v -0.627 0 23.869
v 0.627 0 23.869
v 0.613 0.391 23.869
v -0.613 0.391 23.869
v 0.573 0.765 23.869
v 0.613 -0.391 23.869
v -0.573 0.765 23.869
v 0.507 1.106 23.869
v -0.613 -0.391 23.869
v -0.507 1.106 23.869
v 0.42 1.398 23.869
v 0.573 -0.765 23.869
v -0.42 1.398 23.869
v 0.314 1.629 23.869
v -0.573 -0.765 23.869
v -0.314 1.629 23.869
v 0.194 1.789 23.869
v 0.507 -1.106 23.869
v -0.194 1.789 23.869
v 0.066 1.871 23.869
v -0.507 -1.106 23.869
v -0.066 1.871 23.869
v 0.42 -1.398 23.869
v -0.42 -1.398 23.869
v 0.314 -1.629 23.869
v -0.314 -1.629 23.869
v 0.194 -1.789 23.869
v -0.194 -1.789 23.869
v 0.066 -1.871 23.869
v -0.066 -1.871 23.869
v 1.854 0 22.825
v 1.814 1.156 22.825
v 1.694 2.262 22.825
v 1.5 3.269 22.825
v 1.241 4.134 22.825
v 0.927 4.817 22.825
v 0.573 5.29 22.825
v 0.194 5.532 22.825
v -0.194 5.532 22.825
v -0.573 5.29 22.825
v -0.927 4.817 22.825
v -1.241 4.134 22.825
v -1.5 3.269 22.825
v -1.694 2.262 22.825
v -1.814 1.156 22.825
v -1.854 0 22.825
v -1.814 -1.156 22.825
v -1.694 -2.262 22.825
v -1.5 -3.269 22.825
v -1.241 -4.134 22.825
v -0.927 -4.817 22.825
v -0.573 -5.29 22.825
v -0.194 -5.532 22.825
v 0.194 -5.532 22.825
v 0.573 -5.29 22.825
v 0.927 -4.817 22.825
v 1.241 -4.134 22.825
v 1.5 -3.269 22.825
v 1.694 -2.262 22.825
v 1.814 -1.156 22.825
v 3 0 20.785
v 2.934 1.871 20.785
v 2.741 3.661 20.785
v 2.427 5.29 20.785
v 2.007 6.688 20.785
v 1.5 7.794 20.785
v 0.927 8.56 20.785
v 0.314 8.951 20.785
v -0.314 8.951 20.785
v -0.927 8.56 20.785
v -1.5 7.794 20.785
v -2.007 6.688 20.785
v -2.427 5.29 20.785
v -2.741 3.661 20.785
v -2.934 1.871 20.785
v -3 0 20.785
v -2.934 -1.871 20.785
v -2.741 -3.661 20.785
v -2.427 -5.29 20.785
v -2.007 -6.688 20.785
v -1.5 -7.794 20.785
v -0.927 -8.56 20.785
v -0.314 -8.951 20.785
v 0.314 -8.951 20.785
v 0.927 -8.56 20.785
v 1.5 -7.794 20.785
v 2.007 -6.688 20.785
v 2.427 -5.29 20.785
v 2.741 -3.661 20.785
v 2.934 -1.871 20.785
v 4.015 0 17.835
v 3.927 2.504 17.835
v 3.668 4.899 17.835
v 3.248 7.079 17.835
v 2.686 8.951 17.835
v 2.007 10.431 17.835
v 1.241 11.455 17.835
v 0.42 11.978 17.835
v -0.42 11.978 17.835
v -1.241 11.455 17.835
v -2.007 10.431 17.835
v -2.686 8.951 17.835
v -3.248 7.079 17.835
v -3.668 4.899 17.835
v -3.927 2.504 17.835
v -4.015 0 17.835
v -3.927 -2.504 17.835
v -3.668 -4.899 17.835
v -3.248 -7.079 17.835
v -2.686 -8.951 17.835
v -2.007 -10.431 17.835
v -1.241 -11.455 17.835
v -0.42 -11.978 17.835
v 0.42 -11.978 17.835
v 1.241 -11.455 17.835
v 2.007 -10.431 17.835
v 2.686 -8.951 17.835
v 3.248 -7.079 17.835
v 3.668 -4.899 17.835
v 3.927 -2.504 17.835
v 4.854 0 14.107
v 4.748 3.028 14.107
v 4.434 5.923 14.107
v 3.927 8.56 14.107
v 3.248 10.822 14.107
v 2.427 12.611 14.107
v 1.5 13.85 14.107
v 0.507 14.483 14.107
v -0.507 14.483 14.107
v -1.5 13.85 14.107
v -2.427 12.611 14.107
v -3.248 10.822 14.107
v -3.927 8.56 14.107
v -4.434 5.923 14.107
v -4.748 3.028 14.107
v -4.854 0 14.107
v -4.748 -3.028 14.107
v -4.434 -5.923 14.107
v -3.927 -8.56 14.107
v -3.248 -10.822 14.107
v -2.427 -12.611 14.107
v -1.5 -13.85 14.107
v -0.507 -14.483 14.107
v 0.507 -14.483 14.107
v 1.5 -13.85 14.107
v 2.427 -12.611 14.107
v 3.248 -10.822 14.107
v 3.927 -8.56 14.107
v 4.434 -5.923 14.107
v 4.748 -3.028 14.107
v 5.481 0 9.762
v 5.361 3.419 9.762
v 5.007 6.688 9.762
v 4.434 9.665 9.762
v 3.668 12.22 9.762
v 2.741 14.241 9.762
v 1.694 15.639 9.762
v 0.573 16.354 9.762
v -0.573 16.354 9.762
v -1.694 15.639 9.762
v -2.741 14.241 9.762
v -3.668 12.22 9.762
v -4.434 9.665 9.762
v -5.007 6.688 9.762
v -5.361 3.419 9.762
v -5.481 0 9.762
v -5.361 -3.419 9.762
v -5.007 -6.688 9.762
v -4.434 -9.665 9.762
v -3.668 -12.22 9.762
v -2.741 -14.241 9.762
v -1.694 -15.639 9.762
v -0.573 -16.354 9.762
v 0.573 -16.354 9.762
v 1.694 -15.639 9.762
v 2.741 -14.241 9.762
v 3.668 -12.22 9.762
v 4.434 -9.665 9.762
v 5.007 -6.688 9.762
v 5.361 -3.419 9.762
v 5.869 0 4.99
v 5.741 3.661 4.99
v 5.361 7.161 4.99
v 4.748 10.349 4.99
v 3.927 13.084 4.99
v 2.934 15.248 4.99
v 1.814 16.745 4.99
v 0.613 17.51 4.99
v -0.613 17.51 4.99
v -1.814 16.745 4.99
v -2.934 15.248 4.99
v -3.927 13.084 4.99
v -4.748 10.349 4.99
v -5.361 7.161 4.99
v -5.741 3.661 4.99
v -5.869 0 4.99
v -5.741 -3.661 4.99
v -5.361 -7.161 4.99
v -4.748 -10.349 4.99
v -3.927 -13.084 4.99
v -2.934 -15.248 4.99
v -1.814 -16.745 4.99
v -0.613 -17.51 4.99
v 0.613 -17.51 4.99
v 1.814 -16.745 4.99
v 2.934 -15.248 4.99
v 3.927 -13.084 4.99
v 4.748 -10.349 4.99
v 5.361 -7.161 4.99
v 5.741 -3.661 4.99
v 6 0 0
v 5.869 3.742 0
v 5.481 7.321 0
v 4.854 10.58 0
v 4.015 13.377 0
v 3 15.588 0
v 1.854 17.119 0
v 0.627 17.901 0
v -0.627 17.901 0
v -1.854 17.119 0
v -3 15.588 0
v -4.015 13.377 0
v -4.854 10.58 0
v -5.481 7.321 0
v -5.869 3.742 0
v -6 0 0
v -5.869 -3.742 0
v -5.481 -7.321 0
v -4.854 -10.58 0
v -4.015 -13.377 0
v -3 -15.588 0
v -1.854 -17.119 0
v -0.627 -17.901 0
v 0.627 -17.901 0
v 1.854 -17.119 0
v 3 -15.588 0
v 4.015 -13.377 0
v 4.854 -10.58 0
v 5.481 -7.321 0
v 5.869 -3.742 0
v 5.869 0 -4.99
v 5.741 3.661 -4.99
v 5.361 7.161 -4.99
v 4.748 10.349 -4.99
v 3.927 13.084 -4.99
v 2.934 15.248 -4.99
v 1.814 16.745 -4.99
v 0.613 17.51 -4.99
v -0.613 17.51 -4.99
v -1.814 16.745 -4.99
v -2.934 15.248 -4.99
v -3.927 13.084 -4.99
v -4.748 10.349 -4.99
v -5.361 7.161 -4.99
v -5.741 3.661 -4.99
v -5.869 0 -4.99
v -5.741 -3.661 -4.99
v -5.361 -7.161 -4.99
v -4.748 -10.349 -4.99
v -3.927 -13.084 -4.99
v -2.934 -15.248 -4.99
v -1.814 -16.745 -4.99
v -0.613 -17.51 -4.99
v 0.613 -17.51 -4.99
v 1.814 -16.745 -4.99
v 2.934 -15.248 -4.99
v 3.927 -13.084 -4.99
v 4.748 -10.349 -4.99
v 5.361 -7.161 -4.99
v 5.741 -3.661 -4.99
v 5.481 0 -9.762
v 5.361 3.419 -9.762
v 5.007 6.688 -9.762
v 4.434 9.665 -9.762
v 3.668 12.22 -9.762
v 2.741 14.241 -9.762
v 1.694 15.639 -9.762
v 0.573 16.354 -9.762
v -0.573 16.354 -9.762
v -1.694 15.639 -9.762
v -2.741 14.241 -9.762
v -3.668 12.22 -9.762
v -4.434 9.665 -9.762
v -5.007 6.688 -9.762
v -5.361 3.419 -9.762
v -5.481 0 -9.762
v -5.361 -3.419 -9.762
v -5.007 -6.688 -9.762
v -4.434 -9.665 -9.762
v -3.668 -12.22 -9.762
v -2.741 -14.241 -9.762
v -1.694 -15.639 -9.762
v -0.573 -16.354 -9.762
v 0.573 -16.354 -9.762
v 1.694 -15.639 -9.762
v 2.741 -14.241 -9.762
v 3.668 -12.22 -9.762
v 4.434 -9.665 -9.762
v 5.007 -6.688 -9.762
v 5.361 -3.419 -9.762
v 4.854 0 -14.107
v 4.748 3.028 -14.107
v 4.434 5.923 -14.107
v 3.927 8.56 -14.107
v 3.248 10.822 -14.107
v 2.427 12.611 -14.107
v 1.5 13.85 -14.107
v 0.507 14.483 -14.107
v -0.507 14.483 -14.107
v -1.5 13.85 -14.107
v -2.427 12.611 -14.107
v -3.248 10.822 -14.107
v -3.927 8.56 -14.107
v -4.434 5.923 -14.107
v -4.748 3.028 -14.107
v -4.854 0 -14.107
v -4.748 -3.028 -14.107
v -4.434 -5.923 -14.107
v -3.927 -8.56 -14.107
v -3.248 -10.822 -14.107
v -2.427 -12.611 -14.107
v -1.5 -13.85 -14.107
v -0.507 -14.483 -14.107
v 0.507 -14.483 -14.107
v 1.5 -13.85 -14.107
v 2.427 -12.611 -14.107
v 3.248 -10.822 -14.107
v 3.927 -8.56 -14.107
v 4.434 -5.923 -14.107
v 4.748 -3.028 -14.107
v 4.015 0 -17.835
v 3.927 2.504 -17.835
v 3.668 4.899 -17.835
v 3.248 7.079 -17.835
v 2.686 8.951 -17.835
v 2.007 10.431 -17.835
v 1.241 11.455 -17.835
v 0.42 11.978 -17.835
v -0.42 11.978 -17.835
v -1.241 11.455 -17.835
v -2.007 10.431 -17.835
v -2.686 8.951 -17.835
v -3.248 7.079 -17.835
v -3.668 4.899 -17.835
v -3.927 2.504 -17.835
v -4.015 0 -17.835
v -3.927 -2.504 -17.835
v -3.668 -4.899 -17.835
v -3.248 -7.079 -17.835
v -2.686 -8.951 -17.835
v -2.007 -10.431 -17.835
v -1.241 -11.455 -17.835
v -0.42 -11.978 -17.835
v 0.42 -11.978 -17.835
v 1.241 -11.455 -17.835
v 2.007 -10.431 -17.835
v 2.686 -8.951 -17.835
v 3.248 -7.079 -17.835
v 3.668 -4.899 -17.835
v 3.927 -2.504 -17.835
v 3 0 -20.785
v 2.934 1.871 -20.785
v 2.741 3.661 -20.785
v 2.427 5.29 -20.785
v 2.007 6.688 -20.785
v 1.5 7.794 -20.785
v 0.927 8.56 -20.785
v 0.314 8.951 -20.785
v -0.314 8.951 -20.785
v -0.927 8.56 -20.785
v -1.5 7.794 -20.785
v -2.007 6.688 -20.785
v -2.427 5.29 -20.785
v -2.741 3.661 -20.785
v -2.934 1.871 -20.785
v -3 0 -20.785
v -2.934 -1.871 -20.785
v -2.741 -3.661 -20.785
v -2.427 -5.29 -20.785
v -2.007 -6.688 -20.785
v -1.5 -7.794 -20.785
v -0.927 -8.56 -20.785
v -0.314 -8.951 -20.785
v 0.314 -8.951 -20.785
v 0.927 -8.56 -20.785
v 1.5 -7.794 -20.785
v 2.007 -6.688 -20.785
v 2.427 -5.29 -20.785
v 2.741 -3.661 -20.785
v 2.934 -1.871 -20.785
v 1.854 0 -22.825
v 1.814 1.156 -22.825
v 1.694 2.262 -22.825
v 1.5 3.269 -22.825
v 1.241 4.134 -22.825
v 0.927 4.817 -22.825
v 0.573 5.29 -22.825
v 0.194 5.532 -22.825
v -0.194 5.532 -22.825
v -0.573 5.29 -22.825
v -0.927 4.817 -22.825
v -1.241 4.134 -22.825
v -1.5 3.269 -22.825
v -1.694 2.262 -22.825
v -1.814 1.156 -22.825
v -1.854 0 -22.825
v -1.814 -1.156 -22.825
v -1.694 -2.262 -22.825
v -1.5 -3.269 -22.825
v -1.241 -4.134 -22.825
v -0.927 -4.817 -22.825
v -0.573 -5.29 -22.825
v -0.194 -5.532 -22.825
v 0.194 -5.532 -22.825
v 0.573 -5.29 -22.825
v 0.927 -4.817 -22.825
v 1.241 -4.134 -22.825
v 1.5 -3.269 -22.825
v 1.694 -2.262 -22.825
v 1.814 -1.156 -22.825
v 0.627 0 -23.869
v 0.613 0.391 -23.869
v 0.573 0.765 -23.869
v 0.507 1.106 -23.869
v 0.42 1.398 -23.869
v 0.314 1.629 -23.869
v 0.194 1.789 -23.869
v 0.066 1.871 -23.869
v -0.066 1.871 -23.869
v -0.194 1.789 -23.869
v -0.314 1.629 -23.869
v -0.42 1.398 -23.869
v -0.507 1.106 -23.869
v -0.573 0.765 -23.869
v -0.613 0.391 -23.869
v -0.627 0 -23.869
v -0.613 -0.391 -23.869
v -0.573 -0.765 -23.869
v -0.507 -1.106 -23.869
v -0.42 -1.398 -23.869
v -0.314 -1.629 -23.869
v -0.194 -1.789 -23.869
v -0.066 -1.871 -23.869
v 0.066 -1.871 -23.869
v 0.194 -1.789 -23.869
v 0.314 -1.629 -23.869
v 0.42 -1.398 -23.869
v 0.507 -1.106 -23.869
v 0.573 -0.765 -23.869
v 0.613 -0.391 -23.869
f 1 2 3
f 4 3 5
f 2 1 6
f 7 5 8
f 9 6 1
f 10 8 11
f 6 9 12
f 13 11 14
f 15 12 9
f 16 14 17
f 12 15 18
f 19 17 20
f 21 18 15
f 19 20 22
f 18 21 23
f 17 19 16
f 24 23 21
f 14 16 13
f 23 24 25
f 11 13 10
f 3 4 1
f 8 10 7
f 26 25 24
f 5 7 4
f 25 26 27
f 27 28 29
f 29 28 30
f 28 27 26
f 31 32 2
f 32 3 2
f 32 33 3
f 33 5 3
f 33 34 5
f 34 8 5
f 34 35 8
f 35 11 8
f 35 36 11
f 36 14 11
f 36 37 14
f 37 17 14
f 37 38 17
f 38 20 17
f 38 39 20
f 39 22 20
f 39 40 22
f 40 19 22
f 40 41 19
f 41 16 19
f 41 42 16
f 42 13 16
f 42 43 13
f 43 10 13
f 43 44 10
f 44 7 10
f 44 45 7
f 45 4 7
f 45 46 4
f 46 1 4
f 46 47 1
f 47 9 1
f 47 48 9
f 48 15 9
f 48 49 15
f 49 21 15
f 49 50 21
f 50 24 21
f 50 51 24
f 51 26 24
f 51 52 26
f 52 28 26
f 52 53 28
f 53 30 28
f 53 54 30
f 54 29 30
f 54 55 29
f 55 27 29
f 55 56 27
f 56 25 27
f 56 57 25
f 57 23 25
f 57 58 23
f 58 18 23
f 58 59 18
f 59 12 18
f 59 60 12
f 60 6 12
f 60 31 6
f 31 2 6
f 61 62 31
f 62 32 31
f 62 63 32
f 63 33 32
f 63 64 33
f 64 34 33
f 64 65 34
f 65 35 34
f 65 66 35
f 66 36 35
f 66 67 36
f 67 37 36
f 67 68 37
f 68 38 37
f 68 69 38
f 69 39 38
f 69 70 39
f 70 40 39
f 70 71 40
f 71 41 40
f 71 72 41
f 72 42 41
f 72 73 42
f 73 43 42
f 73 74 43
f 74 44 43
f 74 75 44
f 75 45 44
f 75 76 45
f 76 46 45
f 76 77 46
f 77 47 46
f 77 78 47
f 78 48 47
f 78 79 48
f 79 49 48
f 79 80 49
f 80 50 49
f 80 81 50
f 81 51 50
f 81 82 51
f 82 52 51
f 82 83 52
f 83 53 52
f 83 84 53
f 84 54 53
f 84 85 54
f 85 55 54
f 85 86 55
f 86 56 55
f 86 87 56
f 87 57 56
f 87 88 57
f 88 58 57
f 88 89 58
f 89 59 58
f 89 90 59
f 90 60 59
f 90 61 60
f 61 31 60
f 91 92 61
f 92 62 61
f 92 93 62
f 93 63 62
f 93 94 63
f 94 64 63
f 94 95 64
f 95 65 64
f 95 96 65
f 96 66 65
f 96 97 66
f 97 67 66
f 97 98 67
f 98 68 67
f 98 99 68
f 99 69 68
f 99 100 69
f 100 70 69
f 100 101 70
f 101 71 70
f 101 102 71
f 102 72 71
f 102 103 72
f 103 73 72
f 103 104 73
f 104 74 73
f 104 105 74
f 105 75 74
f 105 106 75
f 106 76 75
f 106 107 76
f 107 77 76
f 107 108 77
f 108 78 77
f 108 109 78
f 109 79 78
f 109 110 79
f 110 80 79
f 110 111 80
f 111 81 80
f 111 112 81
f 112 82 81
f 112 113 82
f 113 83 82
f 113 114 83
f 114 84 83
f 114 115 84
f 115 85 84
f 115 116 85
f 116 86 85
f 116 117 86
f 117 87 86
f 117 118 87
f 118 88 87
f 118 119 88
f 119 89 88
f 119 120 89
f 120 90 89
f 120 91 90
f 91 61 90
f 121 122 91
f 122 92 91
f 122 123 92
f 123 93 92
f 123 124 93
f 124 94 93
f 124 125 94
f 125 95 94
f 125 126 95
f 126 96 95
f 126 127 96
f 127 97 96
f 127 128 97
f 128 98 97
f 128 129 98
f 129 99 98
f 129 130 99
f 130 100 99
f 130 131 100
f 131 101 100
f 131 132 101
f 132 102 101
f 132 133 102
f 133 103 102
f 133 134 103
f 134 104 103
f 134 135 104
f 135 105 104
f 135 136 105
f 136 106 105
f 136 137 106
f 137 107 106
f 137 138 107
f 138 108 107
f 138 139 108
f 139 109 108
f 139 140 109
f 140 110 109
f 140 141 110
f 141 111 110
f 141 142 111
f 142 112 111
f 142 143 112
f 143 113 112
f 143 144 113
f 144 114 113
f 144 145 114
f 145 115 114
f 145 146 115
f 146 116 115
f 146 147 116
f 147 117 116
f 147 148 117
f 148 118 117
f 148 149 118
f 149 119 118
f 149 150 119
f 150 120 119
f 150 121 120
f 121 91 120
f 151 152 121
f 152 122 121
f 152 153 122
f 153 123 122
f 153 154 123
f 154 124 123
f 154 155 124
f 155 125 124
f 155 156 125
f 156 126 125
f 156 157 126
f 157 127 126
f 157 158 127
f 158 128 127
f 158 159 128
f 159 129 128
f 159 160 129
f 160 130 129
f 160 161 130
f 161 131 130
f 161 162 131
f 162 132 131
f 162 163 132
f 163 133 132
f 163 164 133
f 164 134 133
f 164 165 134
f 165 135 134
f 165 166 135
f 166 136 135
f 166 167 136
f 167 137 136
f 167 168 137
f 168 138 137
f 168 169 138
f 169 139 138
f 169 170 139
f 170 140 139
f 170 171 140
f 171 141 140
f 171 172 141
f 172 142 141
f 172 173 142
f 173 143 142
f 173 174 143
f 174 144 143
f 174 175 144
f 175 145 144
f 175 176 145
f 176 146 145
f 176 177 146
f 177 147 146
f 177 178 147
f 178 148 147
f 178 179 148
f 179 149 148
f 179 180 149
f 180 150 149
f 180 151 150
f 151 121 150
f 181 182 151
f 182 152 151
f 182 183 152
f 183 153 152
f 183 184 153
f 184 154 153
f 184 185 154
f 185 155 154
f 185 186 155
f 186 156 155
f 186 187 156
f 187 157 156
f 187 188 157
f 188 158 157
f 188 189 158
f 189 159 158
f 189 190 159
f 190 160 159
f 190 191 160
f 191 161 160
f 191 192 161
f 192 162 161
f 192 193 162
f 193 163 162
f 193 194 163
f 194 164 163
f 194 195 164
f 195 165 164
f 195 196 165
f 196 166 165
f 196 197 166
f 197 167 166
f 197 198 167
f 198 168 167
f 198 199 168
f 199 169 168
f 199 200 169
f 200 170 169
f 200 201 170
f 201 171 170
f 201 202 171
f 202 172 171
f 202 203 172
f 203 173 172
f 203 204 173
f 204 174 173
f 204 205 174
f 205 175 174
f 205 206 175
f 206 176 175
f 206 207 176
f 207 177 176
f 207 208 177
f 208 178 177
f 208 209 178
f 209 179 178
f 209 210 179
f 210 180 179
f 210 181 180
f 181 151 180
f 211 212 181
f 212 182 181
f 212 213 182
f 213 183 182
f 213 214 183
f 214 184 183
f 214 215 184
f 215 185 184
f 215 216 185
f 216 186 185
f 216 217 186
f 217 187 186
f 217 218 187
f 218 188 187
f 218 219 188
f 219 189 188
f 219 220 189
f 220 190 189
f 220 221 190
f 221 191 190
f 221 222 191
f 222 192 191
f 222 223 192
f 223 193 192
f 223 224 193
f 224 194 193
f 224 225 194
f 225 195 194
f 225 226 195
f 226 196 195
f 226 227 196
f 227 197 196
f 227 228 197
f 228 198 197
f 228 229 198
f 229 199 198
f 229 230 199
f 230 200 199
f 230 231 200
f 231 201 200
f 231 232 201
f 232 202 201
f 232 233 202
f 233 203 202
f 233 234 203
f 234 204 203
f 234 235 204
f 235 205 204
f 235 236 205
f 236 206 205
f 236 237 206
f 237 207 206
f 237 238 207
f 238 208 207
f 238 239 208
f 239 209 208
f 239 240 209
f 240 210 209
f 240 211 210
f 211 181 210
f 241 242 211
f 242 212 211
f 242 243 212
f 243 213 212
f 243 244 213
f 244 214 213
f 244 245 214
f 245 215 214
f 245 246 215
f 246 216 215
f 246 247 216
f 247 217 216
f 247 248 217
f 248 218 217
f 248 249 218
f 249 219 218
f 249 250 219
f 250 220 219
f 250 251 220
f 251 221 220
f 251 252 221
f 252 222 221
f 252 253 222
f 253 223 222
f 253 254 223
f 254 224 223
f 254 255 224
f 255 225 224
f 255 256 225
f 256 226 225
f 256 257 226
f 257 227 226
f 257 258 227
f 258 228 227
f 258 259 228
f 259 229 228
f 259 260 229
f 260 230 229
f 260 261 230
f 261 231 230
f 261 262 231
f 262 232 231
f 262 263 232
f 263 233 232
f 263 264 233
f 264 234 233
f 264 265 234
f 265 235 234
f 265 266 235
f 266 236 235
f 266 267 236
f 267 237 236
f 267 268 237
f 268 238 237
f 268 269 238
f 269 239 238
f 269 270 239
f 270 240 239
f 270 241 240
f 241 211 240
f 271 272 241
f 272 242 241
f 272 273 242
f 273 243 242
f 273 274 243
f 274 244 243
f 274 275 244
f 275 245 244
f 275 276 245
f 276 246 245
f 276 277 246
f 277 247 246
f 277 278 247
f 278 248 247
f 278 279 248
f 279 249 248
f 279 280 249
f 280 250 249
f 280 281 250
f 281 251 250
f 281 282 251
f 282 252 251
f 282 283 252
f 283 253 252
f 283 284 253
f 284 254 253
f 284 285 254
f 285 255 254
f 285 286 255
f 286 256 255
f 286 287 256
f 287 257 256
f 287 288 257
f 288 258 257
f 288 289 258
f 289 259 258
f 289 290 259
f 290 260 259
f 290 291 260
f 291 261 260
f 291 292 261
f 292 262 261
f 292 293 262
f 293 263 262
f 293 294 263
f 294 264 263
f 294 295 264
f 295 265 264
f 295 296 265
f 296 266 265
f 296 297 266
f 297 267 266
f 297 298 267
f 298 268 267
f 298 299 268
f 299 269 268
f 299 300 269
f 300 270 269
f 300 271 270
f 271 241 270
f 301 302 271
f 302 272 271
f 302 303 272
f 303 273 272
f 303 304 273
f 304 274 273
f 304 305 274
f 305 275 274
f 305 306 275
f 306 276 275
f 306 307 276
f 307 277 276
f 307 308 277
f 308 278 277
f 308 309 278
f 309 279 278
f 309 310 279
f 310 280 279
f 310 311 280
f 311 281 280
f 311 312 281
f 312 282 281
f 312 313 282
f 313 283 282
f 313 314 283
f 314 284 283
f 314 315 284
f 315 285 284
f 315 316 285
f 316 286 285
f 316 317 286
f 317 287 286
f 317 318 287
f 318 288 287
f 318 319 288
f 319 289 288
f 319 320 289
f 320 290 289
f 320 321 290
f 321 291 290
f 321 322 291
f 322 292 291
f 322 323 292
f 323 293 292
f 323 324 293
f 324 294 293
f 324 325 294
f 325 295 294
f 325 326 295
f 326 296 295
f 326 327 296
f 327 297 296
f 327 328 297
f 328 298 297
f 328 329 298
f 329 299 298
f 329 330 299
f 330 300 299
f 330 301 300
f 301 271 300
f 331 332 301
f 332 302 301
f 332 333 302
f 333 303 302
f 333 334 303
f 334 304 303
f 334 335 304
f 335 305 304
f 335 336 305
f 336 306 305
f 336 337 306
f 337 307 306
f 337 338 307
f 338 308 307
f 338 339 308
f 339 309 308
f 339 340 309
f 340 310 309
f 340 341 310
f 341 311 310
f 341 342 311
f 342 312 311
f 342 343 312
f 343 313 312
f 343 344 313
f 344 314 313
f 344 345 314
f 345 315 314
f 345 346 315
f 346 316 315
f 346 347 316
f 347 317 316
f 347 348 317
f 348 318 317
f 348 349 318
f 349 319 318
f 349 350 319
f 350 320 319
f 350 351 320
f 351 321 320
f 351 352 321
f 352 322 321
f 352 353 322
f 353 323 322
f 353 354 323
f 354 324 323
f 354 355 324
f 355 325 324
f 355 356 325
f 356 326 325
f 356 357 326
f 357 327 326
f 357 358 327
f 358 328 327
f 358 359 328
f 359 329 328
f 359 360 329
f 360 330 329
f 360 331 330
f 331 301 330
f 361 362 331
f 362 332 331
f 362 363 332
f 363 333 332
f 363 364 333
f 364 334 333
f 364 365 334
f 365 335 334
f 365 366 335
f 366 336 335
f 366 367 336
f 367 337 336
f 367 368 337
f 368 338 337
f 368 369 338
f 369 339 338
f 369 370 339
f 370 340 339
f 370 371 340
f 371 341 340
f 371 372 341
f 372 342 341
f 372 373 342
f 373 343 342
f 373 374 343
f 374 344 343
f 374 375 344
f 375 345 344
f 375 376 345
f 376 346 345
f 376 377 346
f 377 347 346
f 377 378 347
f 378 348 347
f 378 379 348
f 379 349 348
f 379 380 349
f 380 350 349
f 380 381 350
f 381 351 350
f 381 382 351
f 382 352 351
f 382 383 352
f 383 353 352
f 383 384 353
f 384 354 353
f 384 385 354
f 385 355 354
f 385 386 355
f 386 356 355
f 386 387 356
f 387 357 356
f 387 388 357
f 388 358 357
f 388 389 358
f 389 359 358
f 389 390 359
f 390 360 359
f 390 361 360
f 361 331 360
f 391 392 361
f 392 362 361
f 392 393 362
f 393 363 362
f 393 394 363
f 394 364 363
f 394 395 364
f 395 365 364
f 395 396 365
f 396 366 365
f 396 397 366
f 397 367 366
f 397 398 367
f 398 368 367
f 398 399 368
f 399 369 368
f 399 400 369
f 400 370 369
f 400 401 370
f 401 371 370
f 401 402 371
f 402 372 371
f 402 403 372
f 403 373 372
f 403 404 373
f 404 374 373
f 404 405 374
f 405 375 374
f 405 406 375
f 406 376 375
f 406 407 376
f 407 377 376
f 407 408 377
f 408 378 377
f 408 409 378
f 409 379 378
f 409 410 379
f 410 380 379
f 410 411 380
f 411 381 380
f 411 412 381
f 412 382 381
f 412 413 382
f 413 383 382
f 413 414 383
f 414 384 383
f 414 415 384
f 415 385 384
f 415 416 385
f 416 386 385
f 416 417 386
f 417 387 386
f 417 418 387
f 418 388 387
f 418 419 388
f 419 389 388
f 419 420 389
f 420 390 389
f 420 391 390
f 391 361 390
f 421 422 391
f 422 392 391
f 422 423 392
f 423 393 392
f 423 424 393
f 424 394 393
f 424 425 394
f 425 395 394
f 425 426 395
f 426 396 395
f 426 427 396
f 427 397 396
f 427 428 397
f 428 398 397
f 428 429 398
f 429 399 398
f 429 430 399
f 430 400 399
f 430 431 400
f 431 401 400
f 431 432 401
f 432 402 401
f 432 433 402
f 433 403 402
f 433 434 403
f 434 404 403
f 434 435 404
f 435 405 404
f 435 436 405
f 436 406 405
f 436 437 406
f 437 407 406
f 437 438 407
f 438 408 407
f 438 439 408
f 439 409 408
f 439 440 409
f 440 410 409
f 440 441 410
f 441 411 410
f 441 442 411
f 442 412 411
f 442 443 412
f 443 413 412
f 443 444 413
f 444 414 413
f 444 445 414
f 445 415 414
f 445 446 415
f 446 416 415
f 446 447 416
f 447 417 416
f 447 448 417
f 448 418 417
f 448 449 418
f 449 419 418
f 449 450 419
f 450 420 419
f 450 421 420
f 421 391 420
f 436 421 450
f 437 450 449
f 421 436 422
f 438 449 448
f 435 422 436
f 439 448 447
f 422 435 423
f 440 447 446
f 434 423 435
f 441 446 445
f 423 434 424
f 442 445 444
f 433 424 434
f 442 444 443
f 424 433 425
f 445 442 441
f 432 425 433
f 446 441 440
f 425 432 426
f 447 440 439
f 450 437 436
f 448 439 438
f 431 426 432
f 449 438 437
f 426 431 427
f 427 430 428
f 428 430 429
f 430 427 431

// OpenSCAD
// Generated by generate_scads.py
scale([0.5,1.5,2.0]) {
  sphere(r=12);
}
